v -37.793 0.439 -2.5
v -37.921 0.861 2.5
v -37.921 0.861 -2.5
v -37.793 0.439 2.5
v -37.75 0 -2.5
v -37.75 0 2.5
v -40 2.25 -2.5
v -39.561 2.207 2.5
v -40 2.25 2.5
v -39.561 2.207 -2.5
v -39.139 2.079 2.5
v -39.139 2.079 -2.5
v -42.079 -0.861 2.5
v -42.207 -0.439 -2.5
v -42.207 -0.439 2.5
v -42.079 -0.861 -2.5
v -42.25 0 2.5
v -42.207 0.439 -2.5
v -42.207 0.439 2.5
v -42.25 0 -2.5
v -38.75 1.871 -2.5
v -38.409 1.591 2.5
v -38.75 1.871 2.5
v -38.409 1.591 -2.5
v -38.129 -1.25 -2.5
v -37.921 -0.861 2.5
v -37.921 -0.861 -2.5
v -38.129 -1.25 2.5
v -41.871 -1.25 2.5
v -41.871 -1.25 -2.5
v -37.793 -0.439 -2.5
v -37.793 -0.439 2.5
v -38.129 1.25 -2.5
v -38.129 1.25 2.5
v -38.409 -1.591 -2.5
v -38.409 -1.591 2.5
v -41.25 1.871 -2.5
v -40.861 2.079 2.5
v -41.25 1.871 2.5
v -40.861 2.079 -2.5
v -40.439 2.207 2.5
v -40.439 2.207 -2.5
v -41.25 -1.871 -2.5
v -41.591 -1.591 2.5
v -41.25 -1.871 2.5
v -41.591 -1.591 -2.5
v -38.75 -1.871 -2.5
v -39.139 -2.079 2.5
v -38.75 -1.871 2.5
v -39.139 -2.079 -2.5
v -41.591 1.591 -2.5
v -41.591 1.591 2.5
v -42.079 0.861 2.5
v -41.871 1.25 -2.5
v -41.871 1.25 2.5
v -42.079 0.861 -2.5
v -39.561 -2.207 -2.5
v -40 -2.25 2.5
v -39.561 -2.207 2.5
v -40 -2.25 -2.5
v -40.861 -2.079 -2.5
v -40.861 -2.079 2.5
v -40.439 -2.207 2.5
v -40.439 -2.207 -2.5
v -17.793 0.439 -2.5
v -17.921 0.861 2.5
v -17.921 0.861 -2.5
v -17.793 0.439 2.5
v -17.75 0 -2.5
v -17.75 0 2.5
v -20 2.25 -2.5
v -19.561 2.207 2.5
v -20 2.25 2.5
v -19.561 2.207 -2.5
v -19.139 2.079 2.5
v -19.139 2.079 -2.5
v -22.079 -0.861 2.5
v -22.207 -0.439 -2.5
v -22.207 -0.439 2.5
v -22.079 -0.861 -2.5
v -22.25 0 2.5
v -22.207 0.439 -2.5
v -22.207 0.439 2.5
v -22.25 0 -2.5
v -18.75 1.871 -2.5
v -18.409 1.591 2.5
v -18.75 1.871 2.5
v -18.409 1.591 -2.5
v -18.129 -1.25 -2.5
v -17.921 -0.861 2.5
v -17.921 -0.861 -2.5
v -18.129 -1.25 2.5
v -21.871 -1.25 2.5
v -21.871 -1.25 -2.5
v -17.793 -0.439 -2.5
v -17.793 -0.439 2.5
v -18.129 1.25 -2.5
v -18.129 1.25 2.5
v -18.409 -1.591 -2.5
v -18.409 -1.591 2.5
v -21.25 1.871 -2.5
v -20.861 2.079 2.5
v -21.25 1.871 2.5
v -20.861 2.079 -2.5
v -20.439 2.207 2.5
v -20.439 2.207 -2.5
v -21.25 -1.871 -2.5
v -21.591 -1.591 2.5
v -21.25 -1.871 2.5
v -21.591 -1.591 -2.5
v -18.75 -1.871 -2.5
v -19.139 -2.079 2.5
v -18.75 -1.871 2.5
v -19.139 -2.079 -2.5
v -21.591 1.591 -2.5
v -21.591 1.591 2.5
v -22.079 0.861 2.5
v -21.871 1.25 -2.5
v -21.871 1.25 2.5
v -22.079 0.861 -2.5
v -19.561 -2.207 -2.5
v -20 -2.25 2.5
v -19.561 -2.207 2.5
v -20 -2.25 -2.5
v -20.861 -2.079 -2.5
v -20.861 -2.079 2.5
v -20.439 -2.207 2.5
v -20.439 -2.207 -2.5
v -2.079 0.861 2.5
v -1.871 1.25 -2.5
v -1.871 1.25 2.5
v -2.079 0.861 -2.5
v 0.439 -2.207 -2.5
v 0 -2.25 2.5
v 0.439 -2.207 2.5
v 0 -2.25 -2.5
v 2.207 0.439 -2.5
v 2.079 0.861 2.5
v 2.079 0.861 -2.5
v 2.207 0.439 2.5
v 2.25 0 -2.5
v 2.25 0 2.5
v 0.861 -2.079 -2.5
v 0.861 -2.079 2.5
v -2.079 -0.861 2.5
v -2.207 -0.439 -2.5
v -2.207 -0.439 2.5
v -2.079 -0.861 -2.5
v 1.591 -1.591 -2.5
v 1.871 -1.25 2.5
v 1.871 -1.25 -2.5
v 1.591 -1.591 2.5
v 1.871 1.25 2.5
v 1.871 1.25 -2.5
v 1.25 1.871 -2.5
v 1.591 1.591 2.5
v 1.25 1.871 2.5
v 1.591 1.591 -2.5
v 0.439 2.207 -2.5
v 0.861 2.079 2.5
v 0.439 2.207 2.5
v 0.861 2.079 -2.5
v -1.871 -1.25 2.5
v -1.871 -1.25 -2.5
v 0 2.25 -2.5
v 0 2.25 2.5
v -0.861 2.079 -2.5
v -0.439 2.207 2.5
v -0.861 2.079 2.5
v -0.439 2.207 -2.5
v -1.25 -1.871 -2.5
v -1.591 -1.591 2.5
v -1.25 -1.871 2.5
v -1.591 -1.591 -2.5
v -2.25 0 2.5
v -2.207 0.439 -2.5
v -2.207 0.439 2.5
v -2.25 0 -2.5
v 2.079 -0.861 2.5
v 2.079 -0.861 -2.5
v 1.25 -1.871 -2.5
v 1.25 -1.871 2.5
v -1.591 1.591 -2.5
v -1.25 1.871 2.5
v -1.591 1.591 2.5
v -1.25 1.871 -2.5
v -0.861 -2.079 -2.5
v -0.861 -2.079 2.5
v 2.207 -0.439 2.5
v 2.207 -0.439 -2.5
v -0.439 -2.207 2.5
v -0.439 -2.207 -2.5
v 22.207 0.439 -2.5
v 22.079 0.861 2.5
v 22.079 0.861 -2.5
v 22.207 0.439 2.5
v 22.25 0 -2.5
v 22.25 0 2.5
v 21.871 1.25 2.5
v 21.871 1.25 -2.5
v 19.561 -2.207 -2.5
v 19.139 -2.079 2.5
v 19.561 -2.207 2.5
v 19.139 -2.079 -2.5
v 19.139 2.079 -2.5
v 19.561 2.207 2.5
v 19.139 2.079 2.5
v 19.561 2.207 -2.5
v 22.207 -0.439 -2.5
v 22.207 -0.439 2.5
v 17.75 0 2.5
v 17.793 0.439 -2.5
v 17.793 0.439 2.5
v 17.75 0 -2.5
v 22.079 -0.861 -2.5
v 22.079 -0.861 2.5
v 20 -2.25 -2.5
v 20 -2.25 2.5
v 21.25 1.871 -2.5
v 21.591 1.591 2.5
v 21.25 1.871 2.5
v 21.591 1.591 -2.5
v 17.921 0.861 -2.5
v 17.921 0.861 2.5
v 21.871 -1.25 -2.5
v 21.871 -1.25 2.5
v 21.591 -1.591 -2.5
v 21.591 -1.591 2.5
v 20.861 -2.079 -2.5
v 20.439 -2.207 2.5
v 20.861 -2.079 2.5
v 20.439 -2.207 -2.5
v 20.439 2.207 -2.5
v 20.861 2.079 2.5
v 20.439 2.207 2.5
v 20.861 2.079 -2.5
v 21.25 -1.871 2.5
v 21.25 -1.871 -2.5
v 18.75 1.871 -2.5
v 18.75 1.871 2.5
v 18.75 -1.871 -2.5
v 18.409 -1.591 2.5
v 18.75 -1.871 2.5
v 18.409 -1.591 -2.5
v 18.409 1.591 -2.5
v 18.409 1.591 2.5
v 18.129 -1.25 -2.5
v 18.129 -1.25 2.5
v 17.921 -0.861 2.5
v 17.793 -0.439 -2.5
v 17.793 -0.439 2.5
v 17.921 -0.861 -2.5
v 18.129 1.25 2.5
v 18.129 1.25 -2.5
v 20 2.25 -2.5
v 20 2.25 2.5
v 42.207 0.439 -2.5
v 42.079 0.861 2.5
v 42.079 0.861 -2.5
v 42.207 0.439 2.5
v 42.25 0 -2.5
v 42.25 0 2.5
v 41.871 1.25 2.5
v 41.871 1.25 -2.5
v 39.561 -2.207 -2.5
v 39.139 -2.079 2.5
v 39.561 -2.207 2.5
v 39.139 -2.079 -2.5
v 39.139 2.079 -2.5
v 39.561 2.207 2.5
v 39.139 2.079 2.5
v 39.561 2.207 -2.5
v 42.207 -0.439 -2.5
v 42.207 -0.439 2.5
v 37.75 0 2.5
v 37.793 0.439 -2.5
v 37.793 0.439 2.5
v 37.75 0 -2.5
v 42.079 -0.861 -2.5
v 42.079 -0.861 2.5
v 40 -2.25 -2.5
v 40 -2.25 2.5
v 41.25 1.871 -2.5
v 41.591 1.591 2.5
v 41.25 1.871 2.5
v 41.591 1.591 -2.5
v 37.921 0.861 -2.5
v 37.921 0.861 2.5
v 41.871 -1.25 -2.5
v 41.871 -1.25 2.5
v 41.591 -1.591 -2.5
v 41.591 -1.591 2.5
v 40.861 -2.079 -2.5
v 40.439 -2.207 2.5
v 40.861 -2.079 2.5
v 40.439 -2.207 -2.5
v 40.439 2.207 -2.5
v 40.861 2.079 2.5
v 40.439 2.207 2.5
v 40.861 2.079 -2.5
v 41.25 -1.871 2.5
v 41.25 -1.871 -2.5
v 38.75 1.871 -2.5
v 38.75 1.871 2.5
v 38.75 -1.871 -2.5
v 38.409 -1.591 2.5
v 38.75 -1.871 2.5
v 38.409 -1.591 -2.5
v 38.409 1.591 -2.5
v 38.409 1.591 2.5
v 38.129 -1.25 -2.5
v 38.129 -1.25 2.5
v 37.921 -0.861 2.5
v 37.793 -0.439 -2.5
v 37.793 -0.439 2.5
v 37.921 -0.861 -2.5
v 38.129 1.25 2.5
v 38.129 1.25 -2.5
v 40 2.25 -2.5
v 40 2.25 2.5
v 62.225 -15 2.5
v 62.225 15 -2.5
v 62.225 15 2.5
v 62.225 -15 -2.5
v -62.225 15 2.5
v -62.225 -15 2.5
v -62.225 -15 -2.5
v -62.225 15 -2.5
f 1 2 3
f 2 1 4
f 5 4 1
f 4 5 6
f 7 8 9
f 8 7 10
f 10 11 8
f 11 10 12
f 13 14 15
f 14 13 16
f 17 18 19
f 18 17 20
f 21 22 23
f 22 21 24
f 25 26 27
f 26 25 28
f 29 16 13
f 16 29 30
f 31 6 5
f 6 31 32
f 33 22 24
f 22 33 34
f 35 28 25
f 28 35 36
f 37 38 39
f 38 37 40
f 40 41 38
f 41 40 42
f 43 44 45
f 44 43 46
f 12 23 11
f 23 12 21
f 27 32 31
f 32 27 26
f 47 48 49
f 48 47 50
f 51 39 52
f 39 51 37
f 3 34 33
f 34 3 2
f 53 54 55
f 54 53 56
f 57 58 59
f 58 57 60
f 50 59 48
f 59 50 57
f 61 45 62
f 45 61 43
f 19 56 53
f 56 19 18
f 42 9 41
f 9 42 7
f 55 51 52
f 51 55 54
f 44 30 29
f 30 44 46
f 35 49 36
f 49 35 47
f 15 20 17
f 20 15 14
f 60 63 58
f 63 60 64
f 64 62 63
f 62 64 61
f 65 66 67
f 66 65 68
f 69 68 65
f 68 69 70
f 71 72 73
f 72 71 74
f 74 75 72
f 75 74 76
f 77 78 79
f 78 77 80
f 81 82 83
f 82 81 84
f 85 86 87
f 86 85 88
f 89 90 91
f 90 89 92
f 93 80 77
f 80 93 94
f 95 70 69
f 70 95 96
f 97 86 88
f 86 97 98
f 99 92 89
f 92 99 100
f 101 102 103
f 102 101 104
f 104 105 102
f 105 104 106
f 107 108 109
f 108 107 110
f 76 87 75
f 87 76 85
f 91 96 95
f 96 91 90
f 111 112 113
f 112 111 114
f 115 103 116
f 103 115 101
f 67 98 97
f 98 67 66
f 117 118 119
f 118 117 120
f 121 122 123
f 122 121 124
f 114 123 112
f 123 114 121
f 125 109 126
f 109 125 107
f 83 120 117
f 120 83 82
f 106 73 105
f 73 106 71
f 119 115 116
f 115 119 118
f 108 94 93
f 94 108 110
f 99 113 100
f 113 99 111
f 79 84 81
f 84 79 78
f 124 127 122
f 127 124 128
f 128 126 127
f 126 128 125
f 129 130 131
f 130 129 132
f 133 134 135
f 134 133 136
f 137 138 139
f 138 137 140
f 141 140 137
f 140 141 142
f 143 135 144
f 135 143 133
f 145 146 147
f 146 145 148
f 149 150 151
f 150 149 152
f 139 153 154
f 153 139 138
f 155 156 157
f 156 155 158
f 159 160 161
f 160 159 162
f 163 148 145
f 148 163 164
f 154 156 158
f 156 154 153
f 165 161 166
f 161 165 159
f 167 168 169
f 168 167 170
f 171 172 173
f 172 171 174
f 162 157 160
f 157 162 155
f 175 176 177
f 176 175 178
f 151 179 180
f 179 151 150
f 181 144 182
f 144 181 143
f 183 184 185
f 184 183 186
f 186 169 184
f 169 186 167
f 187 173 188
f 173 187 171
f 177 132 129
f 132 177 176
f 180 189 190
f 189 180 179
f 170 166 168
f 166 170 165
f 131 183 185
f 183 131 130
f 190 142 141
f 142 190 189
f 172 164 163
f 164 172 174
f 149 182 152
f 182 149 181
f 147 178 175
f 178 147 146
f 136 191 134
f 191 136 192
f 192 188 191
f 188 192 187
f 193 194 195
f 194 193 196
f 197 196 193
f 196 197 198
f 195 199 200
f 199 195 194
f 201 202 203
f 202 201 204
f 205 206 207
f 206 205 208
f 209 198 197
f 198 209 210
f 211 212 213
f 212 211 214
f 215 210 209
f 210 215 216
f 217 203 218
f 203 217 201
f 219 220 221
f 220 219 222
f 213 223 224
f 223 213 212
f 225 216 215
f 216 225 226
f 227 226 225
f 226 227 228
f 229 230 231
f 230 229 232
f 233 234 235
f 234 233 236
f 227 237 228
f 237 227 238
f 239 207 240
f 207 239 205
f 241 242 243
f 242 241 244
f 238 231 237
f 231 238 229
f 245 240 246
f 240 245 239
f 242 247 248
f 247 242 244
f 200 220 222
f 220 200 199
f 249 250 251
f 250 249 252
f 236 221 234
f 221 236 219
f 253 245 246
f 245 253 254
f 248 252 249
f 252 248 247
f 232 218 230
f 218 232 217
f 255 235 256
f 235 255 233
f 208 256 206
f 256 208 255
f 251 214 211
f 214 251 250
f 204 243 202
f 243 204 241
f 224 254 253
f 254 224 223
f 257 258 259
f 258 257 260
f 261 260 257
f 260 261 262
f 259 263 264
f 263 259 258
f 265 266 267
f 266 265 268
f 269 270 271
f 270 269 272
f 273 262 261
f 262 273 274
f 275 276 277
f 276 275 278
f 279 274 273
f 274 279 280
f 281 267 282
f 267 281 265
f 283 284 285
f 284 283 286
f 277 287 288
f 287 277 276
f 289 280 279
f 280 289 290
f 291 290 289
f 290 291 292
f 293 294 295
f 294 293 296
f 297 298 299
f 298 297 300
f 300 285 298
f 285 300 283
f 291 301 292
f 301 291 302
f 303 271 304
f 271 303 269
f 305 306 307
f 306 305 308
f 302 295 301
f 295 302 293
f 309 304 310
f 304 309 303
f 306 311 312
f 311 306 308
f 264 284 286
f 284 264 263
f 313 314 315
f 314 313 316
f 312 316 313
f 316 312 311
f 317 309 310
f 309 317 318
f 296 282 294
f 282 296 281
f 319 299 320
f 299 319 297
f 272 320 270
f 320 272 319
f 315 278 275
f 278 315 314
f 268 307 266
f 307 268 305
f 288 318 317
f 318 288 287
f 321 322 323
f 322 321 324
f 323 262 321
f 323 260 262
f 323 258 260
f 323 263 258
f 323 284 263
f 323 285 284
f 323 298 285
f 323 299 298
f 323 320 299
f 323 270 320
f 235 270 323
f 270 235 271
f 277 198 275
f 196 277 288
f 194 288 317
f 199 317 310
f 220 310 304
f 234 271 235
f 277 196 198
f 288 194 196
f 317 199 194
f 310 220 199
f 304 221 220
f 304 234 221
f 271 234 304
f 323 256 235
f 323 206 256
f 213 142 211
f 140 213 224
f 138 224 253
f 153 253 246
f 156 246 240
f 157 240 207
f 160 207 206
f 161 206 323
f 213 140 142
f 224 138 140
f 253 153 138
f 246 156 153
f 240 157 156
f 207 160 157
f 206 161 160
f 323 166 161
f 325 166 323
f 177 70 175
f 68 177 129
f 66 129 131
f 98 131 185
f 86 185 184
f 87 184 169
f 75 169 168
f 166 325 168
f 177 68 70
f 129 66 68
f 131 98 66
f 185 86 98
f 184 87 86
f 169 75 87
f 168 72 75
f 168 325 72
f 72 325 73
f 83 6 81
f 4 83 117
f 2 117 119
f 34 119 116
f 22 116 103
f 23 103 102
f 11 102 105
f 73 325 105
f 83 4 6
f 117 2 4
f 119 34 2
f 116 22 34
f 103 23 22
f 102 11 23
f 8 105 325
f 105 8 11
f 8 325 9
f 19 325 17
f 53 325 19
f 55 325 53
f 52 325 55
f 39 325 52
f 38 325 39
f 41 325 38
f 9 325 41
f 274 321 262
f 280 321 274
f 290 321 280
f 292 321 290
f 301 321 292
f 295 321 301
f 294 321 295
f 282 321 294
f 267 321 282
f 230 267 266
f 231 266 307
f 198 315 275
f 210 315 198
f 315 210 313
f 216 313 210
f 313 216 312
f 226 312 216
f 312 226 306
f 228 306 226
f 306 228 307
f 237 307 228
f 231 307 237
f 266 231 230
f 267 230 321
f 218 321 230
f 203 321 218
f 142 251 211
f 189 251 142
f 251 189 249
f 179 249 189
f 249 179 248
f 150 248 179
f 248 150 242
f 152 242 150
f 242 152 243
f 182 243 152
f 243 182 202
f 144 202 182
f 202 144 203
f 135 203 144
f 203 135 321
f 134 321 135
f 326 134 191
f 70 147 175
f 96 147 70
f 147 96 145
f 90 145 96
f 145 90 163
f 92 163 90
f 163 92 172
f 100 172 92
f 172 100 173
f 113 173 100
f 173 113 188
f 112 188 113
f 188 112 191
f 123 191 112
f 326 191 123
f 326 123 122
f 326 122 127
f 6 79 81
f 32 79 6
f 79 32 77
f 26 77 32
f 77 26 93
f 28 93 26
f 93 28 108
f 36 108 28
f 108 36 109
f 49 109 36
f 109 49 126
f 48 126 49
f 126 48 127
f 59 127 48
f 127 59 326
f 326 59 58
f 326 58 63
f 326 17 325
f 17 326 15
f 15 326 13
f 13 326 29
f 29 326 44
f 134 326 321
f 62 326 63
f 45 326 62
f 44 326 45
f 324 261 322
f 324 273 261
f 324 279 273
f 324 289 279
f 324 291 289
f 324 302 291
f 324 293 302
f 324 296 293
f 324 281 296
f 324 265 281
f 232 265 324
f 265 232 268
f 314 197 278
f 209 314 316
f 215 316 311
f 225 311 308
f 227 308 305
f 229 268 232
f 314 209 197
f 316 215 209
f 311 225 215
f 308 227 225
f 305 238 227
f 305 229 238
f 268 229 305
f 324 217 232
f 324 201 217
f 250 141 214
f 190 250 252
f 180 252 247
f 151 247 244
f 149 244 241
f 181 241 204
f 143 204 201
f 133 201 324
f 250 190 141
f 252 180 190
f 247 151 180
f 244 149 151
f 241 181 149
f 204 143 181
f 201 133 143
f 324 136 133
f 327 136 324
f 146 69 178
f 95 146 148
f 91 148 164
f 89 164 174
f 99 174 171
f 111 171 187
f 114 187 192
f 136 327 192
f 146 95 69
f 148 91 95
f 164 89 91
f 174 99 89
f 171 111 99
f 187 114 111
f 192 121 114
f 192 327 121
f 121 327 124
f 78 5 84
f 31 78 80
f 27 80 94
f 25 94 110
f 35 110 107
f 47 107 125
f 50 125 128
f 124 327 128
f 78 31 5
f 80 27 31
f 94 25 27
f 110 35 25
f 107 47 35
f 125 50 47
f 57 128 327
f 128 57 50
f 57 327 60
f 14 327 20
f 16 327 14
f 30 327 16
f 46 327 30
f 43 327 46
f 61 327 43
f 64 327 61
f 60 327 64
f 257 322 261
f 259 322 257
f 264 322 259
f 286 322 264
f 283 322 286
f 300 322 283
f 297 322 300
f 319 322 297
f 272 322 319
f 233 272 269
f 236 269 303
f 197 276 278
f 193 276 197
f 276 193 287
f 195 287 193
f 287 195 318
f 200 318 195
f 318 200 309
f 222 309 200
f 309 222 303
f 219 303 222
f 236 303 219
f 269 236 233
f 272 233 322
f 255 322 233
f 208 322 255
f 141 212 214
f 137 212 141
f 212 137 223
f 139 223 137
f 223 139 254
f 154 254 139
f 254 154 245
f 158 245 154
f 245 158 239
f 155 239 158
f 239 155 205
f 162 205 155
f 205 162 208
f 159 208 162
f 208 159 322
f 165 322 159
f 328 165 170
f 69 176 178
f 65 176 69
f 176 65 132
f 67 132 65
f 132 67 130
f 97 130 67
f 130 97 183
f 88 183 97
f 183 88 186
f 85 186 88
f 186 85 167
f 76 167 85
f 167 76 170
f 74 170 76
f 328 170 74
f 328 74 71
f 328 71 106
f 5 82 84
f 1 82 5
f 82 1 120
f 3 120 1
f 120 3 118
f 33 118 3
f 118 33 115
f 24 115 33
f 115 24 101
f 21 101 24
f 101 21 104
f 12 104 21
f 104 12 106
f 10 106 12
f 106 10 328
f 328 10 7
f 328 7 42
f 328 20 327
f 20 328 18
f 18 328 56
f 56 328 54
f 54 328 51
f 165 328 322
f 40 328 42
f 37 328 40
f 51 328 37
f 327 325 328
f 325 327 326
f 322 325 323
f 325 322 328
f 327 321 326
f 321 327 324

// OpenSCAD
$fn = 32;

// ----------------------------------------------------------------------
// Hole bar, 5 x Ø4.5
// row layout, 22.225 mm edge offset
// ----------------------------------------------------------------------

// --- parameters (mm) ---
bar_w = 30;     // bar width (Y)
bar_t = 5;      // bar thickness (Z)
holes = 5;      // holes per row
hole_d = 4.5;   // hole diameter
edge = 22.225;  // offset from the bar end to the first hole
pitch = 20;     // pitch between neighbouring holes

// --- derived feature positions (mm) ---
span = (holes - 1) * pitch;   // = 80   distance between the end holes
bar_l = span + 2 * edge;      // = 124.45   overall bar length
start_x = -bar_l / 2 + edge;  // = -40   X of the first hole
feature_centers = [
  [start_x + 0 * pitch, 0],
  [start_x + 1 * pitch, 0],
  [start_x + 2 * pitch, 0],
  [start_x + 3 * pitch, 0],
  [start_x + 4 * pitch, 0]
];   // hole centres of the first row

// bar with one row of holes, drilled from feature_centers
difference() {
  translate([-bar_l / 2, -bar_w / 2, -bar_t / 2]) cube([bar_l, bar_w, bar_t]);
  for (centre = feature_centers)
    translate([centre[0], centre[1], 0])
      cylinder(d = hole_d, h = bar_t + 2, center = true);
}
